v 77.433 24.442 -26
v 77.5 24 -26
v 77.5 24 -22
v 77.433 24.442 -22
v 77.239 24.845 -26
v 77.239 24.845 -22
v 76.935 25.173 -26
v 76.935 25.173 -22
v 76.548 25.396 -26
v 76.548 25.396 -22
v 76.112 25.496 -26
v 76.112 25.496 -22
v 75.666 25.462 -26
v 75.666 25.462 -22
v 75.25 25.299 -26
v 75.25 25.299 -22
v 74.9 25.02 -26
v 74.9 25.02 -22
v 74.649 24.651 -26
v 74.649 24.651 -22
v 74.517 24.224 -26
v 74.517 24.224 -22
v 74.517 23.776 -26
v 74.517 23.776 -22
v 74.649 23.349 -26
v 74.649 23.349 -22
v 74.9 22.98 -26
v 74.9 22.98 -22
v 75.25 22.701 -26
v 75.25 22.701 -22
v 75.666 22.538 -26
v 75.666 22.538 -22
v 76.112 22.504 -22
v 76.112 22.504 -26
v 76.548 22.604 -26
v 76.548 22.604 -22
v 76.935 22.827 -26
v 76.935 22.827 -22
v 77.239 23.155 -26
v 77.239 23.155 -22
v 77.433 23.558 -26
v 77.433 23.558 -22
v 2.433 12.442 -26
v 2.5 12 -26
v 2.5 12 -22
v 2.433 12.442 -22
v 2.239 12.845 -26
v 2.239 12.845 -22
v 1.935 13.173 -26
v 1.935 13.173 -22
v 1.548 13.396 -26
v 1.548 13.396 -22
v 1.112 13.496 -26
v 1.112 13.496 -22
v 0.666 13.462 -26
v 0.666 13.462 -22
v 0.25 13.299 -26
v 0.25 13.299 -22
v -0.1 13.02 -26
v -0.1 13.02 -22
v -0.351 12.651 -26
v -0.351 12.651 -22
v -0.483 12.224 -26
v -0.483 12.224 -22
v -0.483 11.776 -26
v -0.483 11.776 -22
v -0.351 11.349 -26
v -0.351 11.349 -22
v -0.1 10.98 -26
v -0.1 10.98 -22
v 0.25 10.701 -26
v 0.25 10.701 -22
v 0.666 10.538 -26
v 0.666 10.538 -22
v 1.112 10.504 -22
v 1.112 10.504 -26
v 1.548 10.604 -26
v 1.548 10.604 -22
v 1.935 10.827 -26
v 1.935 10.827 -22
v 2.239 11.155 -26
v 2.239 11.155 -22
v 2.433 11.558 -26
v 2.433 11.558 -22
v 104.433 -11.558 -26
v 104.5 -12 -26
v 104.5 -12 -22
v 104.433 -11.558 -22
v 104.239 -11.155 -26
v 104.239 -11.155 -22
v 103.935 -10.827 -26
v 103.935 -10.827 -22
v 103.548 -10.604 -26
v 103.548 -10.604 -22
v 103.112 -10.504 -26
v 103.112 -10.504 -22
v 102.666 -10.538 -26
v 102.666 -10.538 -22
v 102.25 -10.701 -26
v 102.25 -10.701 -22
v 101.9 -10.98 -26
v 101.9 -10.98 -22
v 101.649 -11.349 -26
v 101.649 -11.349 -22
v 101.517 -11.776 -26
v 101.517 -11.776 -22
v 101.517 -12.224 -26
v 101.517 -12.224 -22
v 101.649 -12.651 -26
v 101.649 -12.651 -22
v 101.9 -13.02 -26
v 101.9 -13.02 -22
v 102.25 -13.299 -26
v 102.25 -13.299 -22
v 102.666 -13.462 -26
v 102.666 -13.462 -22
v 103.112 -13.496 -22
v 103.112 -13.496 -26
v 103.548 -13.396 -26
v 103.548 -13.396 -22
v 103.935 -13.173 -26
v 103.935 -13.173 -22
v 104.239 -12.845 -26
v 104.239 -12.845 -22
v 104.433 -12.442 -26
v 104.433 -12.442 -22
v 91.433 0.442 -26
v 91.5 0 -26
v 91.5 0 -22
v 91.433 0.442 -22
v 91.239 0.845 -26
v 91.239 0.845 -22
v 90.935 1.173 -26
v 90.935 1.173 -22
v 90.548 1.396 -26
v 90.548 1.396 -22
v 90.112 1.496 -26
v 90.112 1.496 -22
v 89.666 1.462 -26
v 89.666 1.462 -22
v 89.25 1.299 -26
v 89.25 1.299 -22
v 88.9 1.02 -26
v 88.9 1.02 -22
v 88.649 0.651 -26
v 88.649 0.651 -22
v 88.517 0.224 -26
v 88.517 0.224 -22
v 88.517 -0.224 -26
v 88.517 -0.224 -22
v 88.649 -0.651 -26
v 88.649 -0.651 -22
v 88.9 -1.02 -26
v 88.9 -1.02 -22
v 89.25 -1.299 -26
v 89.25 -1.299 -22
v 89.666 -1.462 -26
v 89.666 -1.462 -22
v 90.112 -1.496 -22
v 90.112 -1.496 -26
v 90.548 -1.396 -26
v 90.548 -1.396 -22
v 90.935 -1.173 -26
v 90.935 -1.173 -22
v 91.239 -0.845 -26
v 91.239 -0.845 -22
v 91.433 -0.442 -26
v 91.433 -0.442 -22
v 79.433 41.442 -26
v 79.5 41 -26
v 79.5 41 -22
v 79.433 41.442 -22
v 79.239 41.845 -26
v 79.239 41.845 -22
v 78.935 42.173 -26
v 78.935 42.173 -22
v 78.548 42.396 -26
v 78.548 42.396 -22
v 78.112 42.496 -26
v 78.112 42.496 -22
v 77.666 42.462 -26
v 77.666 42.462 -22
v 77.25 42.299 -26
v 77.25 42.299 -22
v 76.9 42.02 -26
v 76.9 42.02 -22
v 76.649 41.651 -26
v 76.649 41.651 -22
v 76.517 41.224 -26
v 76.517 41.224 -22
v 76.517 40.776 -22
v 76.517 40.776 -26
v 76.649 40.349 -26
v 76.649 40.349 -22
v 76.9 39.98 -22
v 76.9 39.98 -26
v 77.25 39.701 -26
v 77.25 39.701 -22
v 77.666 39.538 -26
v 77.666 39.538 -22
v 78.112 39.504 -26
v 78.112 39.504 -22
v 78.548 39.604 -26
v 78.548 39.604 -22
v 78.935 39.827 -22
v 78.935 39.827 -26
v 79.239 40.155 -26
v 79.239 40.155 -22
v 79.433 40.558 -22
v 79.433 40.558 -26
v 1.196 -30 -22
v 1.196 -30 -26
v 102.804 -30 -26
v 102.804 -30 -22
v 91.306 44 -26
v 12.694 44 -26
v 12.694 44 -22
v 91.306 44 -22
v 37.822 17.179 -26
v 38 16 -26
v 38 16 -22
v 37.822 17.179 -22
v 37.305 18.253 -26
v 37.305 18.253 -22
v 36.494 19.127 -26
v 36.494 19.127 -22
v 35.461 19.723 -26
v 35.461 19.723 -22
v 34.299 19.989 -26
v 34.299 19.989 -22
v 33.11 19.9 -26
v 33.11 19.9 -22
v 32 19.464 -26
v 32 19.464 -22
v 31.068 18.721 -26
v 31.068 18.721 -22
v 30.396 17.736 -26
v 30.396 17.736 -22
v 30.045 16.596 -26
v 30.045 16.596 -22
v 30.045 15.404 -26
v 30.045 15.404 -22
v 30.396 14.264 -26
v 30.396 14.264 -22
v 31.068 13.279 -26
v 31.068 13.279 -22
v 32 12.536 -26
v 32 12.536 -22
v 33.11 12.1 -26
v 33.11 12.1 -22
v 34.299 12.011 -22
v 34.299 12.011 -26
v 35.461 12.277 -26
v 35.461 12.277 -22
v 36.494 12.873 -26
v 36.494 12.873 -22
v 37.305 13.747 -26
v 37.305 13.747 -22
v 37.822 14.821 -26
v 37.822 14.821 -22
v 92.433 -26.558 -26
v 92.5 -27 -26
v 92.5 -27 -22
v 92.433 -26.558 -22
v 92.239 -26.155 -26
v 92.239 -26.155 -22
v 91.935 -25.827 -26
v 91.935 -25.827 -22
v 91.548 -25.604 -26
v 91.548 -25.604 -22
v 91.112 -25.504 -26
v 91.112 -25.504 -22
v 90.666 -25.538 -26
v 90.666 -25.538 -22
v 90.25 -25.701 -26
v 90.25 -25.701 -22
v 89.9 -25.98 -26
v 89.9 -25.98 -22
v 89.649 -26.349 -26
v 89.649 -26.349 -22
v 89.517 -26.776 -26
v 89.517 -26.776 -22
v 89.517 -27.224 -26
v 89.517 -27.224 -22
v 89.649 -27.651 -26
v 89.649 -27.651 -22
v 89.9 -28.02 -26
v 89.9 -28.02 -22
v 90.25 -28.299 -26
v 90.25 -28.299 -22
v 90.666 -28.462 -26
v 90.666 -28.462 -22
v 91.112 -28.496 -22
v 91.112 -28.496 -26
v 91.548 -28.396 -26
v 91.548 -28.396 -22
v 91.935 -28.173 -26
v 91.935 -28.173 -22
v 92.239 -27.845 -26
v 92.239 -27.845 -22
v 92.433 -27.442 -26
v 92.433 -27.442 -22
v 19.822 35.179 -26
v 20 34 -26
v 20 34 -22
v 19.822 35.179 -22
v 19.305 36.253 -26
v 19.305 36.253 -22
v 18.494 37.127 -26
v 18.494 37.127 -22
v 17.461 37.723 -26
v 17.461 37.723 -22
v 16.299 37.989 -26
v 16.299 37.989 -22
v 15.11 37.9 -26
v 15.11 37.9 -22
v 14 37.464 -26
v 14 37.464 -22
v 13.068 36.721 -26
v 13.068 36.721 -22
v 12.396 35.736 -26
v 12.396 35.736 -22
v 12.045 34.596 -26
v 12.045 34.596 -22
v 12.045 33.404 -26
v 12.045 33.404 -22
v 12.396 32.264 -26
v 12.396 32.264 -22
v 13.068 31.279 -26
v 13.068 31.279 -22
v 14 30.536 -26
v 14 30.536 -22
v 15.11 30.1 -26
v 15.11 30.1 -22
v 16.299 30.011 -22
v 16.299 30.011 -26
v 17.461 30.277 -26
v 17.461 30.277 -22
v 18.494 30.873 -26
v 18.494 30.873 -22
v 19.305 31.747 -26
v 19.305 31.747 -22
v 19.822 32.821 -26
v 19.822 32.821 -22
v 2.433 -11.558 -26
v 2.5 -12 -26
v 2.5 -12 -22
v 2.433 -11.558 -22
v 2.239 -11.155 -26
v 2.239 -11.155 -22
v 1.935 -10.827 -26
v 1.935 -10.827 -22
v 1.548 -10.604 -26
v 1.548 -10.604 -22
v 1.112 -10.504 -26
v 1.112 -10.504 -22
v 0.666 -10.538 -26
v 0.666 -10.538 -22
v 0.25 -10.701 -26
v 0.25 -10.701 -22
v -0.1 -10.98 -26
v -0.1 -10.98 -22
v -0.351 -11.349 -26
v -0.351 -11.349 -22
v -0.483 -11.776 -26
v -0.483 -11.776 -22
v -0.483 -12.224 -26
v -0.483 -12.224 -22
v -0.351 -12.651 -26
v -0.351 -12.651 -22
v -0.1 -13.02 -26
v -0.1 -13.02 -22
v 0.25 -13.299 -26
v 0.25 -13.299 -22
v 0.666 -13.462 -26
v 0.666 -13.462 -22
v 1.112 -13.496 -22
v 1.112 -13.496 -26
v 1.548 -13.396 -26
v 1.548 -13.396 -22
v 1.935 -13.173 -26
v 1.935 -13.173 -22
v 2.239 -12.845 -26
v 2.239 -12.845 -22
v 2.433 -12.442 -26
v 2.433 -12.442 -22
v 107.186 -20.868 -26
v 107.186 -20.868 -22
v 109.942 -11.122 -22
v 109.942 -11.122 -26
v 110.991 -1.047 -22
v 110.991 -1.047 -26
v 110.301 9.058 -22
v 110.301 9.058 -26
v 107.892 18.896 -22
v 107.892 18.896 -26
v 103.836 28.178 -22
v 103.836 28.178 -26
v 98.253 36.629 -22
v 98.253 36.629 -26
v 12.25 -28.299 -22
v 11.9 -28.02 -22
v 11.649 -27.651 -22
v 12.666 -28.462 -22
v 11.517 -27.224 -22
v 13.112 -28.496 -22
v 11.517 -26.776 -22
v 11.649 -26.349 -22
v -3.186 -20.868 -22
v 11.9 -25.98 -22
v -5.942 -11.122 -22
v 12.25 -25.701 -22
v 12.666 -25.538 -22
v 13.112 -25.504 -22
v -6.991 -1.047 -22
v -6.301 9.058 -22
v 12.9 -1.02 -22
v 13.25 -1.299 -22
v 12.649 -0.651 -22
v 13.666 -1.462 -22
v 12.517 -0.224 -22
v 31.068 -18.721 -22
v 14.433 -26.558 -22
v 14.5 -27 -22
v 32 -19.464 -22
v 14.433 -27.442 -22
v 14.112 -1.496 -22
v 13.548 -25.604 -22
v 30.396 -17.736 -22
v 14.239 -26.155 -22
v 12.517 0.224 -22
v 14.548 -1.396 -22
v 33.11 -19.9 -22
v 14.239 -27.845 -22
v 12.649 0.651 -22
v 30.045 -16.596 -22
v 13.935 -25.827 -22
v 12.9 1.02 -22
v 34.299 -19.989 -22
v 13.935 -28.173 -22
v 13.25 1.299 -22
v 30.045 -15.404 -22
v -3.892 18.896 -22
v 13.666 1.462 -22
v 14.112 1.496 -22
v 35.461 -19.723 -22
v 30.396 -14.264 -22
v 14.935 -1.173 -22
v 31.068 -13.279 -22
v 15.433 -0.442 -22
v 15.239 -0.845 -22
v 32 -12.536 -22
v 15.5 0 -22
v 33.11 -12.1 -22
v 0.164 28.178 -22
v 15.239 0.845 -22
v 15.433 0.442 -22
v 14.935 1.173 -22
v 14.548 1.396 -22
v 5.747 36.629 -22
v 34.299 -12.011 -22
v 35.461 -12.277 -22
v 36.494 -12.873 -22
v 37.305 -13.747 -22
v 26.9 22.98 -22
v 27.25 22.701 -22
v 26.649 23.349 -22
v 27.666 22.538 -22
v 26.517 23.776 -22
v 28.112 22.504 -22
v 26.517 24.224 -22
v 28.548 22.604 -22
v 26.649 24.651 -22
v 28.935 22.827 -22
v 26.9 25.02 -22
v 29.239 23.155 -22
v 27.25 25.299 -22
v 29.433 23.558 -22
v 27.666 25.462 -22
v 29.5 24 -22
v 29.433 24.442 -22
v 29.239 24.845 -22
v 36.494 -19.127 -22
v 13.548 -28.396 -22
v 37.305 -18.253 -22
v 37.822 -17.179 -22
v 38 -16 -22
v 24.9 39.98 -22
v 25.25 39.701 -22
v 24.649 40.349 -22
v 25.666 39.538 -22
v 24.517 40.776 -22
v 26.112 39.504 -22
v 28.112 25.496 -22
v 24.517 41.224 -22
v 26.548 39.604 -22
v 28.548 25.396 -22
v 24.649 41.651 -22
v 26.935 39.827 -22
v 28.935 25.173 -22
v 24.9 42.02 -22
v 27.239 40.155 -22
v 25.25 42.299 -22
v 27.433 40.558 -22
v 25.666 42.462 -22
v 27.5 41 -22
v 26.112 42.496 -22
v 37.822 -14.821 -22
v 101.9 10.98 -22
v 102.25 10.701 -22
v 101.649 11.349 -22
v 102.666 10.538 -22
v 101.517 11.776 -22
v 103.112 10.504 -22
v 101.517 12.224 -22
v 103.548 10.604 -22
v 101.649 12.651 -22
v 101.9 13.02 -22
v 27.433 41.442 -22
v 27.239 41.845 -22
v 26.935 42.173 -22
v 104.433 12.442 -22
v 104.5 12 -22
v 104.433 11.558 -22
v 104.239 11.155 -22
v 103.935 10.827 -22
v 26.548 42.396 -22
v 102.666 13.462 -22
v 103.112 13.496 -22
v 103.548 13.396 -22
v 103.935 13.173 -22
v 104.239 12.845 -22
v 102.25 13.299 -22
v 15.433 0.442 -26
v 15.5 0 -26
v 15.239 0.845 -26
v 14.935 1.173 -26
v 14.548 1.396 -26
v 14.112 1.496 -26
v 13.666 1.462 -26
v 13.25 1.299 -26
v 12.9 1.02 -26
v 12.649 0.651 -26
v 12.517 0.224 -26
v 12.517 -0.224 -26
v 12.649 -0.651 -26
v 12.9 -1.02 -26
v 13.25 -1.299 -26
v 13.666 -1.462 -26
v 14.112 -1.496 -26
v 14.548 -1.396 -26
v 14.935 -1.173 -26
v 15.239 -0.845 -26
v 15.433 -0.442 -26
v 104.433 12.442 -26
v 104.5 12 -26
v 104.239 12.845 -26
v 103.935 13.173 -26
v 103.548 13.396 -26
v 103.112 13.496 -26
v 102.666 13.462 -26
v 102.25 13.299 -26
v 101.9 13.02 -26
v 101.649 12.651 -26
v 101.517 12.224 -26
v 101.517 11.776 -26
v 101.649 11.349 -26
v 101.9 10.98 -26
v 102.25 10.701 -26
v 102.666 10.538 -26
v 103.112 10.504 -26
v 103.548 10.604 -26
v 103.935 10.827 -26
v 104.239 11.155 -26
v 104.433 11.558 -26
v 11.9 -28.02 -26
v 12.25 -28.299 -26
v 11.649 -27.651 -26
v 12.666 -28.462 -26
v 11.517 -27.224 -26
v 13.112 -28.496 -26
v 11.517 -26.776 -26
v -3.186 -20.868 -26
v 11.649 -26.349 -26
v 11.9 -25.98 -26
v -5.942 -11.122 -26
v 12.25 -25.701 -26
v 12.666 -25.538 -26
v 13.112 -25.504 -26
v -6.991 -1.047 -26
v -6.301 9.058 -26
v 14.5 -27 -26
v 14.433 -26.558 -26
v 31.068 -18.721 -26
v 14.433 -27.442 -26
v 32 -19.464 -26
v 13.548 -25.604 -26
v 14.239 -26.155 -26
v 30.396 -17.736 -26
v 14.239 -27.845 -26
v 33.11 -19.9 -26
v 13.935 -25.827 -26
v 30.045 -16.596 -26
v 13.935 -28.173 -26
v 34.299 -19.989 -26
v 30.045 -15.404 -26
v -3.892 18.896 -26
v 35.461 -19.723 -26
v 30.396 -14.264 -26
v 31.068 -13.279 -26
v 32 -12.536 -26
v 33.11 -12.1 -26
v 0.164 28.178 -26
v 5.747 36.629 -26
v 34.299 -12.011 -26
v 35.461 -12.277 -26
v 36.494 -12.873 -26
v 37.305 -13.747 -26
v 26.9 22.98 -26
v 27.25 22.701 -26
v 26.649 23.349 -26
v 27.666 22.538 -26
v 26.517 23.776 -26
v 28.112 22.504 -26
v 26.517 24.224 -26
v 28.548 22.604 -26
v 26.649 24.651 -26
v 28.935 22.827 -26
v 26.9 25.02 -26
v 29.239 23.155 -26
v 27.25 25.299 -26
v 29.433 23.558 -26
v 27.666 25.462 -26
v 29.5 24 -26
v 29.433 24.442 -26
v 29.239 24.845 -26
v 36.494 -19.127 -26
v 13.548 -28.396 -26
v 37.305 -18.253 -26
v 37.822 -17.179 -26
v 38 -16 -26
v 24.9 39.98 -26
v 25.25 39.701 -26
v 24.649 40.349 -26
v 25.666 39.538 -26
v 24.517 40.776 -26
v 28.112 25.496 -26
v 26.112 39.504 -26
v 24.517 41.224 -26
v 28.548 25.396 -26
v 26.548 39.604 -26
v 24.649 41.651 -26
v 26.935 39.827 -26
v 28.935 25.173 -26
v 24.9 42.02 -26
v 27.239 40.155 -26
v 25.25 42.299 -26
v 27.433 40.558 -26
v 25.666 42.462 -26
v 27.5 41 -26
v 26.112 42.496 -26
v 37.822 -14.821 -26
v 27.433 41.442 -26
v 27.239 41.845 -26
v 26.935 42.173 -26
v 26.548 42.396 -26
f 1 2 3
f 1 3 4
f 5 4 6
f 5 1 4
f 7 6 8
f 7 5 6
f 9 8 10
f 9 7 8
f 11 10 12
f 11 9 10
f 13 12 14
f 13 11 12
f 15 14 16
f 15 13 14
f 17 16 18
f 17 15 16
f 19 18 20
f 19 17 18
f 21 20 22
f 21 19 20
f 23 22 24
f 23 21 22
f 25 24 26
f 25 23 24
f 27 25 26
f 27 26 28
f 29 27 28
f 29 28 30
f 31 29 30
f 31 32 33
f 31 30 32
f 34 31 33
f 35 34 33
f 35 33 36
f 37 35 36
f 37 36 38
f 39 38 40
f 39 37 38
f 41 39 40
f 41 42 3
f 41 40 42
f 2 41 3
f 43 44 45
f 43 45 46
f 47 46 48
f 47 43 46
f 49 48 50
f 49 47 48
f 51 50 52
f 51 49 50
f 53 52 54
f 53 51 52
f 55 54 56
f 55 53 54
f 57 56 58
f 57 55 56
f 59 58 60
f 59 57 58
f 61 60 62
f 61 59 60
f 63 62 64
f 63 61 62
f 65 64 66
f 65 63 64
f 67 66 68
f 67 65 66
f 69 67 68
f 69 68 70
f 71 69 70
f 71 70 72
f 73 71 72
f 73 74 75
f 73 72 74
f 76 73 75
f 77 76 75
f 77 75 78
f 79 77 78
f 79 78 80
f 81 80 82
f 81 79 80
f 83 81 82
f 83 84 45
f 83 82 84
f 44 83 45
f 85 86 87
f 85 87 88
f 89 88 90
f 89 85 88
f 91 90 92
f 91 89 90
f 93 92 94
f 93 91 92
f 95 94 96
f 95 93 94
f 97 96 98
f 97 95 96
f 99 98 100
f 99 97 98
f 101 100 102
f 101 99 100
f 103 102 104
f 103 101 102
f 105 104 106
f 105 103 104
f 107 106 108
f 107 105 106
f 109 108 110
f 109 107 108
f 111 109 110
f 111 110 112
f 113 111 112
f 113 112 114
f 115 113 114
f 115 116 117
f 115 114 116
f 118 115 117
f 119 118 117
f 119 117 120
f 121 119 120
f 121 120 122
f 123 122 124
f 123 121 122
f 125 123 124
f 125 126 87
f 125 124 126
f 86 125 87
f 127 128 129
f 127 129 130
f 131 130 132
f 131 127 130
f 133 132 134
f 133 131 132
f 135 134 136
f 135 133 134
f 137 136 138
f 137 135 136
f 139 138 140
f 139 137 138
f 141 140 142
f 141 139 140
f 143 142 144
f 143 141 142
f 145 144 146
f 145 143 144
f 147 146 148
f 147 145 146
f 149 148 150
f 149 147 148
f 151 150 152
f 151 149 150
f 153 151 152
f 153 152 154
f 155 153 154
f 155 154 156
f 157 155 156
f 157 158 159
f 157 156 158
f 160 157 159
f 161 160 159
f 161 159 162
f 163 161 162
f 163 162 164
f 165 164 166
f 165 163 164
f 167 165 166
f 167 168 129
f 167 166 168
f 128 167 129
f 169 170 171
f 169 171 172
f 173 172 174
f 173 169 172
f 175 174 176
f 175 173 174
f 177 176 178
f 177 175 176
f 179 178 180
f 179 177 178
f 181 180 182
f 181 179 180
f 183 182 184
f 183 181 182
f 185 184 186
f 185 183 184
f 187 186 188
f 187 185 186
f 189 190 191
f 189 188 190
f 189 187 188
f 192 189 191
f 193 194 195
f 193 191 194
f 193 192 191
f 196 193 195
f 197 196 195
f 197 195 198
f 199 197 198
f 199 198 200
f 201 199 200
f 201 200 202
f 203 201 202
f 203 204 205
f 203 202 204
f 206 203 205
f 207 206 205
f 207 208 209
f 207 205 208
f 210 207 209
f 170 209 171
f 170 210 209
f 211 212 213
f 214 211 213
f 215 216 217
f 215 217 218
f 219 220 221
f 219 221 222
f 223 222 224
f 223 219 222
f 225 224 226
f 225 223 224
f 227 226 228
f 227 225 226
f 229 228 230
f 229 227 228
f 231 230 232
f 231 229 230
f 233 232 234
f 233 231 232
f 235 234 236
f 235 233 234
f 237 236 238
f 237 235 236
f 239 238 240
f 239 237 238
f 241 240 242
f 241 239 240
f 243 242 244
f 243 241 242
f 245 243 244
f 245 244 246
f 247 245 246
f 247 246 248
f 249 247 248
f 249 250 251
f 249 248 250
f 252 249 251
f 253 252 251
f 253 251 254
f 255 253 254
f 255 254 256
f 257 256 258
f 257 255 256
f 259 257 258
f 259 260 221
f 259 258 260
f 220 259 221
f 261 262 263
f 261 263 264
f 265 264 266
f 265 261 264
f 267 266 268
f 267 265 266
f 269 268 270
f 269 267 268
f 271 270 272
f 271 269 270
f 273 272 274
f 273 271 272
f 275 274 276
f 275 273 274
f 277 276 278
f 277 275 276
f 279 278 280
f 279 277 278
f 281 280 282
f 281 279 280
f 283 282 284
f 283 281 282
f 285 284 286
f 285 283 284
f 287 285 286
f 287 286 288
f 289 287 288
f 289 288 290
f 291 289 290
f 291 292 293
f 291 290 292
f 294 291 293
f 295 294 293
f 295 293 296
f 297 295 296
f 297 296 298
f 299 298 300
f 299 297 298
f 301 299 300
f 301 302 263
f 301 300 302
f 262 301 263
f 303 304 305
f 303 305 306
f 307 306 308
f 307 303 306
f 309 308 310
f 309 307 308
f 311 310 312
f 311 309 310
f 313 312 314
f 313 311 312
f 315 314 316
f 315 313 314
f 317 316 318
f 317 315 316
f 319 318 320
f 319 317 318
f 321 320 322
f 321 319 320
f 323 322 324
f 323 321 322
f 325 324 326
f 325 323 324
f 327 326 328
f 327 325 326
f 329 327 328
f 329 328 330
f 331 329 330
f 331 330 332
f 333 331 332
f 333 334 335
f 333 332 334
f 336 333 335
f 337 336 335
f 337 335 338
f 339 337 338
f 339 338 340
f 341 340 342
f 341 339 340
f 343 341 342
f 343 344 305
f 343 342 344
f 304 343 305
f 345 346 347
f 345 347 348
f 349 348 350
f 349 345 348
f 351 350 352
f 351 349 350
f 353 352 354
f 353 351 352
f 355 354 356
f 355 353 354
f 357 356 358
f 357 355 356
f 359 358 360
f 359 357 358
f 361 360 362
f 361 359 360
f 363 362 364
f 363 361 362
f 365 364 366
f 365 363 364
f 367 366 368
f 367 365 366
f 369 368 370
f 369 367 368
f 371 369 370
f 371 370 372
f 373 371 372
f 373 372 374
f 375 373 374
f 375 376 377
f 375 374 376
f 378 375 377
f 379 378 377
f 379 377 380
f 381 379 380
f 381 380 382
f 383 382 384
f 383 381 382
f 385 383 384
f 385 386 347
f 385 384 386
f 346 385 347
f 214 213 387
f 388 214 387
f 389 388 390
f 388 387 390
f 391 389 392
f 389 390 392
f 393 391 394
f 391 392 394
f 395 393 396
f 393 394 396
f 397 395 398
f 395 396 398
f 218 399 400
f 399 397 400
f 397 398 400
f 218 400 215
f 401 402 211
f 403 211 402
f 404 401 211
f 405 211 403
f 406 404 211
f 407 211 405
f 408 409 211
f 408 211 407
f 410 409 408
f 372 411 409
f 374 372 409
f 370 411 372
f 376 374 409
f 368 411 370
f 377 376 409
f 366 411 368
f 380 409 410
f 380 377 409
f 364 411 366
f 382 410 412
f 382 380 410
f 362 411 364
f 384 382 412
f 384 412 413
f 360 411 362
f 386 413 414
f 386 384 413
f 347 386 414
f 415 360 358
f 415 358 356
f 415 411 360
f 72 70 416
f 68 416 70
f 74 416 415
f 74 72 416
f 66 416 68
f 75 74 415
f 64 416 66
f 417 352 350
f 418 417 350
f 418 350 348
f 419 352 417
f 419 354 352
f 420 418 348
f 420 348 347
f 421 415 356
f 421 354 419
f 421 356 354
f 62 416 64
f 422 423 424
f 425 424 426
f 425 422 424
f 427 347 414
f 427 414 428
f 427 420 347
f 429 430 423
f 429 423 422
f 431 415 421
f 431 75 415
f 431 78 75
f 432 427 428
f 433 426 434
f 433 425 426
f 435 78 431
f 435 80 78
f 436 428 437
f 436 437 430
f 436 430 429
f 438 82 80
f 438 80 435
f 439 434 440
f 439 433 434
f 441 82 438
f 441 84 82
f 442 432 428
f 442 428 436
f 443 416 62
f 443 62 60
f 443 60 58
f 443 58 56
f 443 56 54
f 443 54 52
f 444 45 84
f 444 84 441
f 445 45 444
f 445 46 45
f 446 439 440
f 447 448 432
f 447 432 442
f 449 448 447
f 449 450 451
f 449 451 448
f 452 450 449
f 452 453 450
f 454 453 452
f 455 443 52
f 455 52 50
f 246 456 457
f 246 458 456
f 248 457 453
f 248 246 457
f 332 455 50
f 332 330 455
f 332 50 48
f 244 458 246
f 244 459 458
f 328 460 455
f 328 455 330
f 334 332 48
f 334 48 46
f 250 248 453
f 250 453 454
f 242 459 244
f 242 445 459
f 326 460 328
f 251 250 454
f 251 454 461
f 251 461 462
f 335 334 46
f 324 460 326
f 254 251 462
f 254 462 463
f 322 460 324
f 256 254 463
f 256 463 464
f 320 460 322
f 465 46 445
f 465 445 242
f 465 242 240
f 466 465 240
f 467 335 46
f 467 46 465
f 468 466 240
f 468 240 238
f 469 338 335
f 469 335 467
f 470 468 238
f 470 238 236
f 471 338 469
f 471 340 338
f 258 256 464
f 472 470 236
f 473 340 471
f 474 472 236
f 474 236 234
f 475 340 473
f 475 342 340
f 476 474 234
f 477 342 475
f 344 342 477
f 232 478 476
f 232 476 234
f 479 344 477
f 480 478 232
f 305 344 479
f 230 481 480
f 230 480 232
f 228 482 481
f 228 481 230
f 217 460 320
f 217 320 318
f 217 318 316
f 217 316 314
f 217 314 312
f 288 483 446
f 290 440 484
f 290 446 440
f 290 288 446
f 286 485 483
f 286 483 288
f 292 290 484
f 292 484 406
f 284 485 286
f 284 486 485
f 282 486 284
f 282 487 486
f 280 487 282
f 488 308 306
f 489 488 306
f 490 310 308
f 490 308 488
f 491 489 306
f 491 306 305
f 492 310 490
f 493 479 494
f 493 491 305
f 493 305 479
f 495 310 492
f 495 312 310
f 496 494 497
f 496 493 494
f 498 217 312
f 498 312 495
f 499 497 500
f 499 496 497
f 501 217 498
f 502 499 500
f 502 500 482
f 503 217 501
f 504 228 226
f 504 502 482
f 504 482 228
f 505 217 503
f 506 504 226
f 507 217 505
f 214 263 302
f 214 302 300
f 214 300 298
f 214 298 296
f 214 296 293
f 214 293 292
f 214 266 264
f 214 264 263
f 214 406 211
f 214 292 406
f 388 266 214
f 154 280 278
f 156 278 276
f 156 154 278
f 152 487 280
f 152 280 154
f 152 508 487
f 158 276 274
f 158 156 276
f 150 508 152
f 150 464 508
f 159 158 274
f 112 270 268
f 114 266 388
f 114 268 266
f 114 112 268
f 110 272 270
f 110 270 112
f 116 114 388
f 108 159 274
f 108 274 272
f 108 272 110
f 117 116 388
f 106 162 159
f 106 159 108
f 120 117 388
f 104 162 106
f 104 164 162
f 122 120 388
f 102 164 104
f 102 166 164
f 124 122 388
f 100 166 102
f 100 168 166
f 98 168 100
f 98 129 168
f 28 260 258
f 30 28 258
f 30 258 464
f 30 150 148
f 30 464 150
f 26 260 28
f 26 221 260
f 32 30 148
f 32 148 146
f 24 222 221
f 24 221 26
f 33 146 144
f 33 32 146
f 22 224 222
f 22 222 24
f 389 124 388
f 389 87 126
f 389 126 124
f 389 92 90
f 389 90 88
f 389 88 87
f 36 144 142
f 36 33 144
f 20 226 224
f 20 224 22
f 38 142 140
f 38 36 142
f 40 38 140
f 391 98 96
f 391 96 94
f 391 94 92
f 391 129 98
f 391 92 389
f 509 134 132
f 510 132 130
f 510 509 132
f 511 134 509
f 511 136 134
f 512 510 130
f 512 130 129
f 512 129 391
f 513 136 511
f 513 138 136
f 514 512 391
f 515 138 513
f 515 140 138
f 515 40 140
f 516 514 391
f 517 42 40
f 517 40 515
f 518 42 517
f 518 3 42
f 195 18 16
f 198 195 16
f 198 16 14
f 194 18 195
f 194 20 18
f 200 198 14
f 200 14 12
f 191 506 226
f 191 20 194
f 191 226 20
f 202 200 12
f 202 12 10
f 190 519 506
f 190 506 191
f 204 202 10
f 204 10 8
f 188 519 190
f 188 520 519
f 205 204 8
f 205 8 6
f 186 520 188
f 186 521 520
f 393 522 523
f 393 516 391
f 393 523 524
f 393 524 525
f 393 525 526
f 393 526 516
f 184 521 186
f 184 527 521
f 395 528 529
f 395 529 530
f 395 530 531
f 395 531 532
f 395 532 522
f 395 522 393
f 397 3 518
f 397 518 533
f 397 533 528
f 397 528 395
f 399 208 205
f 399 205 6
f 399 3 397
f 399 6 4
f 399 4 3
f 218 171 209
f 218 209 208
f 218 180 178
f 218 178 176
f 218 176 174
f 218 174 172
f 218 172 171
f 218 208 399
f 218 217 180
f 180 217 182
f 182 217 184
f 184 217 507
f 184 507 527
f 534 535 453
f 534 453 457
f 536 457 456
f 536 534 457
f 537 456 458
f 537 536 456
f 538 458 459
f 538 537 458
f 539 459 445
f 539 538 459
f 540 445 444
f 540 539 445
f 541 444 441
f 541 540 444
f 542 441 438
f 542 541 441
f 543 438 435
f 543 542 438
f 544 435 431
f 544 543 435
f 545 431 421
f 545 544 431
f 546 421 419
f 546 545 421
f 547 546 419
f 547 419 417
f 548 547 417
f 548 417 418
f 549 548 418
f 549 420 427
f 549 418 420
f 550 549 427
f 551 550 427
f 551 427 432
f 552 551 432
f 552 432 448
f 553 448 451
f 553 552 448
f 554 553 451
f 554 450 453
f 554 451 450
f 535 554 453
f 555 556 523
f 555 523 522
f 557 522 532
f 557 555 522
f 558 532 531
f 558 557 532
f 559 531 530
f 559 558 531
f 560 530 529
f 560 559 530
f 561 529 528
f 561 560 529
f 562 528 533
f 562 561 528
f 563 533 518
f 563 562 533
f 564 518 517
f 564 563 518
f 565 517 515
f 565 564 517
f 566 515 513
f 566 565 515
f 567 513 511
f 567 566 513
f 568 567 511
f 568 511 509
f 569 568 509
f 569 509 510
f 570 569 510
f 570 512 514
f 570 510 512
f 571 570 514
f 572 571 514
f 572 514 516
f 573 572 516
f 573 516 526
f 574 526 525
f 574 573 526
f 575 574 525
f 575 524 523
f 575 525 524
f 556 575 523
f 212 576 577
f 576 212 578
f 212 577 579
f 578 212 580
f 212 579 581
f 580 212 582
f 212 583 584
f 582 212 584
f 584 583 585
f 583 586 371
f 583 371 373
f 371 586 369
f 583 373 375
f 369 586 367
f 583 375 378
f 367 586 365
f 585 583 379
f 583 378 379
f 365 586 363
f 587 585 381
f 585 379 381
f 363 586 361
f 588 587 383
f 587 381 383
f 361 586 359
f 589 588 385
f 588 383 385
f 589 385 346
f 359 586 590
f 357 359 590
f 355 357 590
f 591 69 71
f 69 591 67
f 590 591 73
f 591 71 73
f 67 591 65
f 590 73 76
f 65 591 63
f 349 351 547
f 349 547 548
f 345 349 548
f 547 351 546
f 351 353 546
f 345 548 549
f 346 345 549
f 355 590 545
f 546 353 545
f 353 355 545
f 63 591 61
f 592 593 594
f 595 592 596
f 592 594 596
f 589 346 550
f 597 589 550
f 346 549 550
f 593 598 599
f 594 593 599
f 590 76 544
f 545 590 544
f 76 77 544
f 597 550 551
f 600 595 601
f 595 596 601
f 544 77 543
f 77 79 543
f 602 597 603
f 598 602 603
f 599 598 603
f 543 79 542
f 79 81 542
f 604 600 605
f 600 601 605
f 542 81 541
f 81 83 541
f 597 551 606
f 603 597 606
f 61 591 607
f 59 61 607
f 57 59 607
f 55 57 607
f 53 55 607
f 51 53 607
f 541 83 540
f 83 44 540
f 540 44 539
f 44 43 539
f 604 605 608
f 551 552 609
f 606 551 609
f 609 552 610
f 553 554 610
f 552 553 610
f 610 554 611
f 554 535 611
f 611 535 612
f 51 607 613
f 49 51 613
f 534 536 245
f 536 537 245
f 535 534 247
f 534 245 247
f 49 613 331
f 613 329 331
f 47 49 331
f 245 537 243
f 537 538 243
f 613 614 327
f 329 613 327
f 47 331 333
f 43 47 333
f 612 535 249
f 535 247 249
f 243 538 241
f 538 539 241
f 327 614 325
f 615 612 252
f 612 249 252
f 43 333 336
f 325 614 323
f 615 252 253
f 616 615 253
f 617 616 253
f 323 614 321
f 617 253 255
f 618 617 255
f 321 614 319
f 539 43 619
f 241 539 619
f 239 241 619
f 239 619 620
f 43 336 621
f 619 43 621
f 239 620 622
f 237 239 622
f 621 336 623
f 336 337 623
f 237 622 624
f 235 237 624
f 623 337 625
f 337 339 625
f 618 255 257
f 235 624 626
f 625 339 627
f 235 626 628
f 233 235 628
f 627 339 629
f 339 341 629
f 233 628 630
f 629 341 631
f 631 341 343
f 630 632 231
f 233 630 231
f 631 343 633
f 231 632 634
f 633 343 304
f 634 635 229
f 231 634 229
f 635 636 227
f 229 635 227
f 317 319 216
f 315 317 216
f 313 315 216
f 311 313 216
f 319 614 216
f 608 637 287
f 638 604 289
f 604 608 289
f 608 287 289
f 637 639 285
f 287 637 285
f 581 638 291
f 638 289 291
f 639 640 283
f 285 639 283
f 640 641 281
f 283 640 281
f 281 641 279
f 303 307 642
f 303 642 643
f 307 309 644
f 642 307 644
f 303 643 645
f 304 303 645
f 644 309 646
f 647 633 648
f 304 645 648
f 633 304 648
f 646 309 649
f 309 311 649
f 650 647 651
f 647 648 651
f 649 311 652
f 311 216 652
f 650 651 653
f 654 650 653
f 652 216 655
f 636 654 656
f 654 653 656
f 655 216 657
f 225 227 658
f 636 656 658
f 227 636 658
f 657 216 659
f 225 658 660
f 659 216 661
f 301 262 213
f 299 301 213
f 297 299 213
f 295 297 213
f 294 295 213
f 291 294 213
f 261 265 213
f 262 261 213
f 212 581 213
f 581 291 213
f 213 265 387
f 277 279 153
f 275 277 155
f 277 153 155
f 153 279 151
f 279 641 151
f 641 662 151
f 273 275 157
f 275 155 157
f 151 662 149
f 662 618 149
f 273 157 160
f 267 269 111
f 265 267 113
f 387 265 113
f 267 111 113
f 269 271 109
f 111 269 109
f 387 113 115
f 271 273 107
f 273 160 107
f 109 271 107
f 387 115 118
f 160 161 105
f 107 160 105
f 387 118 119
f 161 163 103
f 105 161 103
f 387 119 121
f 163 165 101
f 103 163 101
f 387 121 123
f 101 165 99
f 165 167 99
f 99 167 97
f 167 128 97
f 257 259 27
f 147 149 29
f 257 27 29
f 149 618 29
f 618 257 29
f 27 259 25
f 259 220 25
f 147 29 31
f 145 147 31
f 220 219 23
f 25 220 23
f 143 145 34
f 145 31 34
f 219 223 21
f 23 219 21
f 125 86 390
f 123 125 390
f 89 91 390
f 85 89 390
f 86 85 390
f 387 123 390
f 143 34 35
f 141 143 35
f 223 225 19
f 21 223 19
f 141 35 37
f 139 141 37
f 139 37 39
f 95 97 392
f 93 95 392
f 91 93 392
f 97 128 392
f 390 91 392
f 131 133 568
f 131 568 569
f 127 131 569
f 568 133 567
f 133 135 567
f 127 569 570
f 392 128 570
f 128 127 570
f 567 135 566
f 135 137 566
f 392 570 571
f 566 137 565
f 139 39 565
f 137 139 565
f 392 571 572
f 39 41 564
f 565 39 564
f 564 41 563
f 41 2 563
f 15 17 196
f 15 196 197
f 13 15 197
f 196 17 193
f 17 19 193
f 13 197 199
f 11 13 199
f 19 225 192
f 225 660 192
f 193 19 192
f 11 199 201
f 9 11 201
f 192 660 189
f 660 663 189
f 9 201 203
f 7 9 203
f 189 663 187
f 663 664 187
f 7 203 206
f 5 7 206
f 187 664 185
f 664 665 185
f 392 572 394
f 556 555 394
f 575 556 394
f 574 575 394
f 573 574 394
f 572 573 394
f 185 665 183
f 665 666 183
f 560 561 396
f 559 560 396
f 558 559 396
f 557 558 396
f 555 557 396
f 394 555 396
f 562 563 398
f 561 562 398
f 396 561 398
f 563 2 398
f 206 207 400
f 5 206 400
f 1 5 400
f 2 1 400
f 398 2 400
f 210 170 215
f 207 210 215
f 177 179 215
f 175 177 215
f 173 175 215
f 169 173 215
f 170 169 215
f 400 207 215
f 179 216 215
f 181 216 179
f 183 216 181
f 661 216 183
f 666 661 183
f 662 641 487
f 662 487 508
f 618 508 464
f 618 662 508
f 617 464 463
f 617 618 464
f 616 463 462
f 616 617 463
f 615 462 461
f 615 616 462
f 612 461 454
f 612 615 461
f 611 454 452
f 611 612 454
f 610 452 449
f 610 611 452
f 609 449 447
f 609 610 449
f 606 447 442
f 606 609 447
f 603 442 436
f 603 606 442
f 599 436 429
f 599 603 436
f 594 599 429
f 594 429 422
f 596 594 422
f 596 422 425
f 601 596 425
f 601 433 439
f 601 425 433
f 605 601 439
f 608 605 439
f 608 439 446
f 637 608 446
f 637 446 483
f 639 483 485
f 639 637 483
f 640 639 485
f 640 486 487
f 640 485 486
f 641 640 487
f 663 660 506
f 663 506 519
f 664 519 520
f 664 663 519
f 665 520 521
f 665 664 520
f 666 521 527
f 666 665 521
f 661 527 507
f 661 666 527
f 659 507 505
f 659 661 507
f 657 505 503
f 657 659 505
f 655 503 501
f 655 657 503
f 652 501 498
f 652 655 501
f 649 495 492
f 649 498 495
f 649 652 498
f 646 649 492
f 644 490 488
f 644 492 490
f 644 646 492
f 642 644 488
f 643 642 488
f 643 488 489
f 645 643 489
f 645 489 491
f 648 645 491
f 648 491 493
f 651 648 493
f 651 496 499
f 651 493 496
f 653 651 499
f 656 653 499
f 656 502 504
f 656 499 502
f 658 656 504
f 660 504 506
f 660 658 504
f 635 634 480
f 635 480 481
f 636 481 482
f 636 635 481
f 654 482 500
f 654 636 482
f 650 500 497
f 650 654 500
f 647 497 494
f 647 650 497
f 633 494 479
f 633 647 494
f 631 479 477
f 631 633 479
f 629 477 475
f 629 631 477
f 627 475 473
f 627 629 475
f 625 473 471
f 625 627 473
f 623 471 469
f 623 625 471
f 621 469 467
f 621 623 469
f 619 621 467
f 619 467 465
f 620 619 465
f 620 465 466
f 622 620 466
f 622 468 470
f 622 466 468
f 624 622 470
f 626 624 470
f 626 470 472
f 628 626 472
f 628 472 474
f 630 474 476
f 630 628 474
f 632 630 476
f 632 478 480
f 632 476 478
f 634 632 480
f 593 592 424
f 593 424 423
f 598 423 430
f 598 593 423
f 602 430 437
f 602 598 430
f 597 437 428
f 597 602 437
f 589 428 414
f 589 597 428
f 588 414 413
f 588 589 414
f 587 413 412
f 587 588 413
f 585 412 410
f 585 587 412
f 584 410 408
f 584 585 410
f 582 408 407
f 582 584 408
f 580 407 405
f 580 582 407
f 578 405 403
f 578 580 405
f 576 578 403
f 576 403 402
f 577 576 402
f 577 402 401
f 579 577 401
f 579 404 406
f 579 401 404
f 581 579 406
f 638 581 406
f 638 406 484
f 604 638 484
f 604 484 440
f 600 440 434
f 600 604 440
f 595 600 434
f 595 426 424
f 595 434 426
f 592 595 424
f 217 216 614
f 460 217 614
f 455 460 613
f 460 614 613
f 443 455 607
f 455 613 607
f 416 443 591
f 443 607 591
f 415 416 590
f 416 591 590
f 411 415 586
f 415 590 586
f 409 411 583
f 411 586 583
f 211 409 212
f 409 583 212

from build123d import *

# Parameters (mm, degrees)
CYLINDER1528_R     = 1.5
CYLINDER1528_DEPTH = 100
CYLINDER1527_R     = 1.5
CYLINDER1527_DEPTH = 100
CYLINDER1526_R     = 1.5
CYLINDER1526_DEPTH = 32
CYLINDER1525_R     = 1.5
CYLINDER1525_DEPTH = 32
BOX520_W           = 200
BOX520_H           = 100
BOX520_DEPTH       = 100
BOX519_W           = 200
BOX519_H           = 100
BOX519_DEPTH       = 100
CYLINDER1518_R     = 4
CYLINDER1518_DEPTH = 100
CYLINDER1519_R     = 4
CYLINDER1519_DEPTH = 100
CYLINDER1520_R     = 4
CYLINDER1520_DEPTH = 100
CYLINDER1521_R     = 4
CYLINDER1521_DEPTH = 100
CYLINDER1522_R     = 4
CYLINDER1522_DEPTH = 100
CYLINDER1523_R     = 4
CYLINDER1523_DEPTH = 100
CYLINDER1524_R     = 4
CYLINDER1524_DEPTH = 100
CYLINDER1517_R     = 4
CYLINDER1517_DEPTH = 100
CYLINDER1510_R     = 1.5
CYLINDER1510_DEPTH = 100
CYLINDER1511_R     = 1.5
CYLINDER1511_DEPTH = 100
CYLINDER1512_R     = 1.5
CYLINDER1512_DEPTH = 100
CYLINDER1513_R     = 1.5
CYLINDER1513_DEPTH = 100
CYLINDER1514_R     = 1.5
CYLINDER1514_DEPTH = 100
CYLINDER1515_R     = 1.5
CYLINDER1515_DEPTH = 100
CYLINDER1516_R     = 1.5
CYLINDER1516_DEPTH = 100
CYLINDER1509_R     = 1.5
CYLINDER1509_DEPTH = 100
CYLINDER1508_R     = 59
CYLINDER1508_DEPTH = 4


with BuildPart() as v_lec1528:
    # Cylinder1528 → Cylinder1528 (new body)
    with BuildSketch(Plane(origin=(14, 0, -60), x_dir=(1, 0, 0), z_dir=(0, 0, 1))):
        Circle(CYLINDER1528_R)
    extrude(amount=CYLINDER1528_DEPTH)


with BuildPart() as srouby_troj010:
    # Cylinder1527 → Cylinder1527 (new body)
    with BuildSketch(Plane(origin=(90, 0, -60), x_dir=(1, 0, 0), z_dir=(0, 0, 1))):
        Circle(CYLINDER1527_R)
    extrude(amount=CYLINDER1527_DEPTH)

    # Compound900: union Válec1528
    add(v_lec1528.part)


with BuildPart() as v_lec1526:
    # Cylinder1526 → Cylinder1526 (new body)
    with BuildSketch(Plane(origin=(78, 41, -42), x_dir=(1, 0, 0), z_dir=(0, 0, 1))):
        Circle(CYLINDER1526_R)
    extrude(amount=CYLINDER1526_DEPTH)


with BuildPart() as compound899:
    # Cylinder1525 → Cylinder1525 (new body)
    with BuildSketch(Plane(origin=(26, 41, -42), x_dir=(1, 0, 0), z_dir=(0, 0, 1))):
        Circle(CYLINDER1525_R)
    extrude(amount=CYLINDER1525_DEPTH)

    # Compound899: union Válec1526
    add(v_lec1526.part)


with BuildPart() as krychle520:
    # Box520 → Box520 (new body)
    with BuildSketch(Plane(origin=(-60, 44, -90), x_dir=(1, 0, 0), z_dir=(0, 0, 1))):
        with Locations((100, 50)):
            Rectangle(BOX520_W, BOX520_H)
    extrude(amount=BOX520_DEPTH)


with BuildPart() as krychle519:
    # Box519 → Box519 (new body)
    with BuildSketch(Plane(origin=(-60, -130, -90), x_dir=(1, 0, 0), z_dir=(0, 0, 1))):
        with Locations((100, 50)):
            Rectangle(BOX519_W, BOX519_H)
    extrude(amount=BOX519_DEPTH)


with BuildPart() as v_lec1518:
    # Cylinder1518 → Cylinder1518 (new body)
    with BuildSketch(Plane(origin=(-16, 34, -90), x_dir=(1, 0, 0), z_dir=(0, 0, 1))):
        Circle(CYLINDER1518_R)
    extrude(amount=CYLINDER1518_DEPTH)


with BuildPart() as v_lec1519:
    # Cylinder1519 → Cylinder1519 (new body)
    with BuildSketch(Plane(origin=(-16, -34, -90), x_dir=(1, 0, 0), z_dir=(0, 0, 1))):
        Circle(CYLINDER1519_R)
    extrude(amount=CYLINDER1519_DEPTH)


with BuildPart() as v_lec1520:
    # Cylinder1520 → Cylinder1520 (new body)
    with BuildSketch(Plane(origin=(34, -16, -90), x_dir=(1, 0, 0), z_dir=(0, 0, 1))):
        Circle(CYLINDER1520_R)
    extrude(amount=CYLINDER1520_DEPTH)


with BuildPart() as v_lec1521:
    # Cylinder1521 → Cylinder1521 (new body)
    with BuildSketch(Plane(origin=(16, 34, -90), x_dir=(1, 0, 0), z_dir=(0, 0, 1))):
        Circle(CYLINDER1521_R)
    extrude(amount=CYLINDER1521_DEPTH)


with BuildPart() as v_lec1522:
    # Cylinder1522 → Cylinder1522 (new body)
    with BuildSketch(Plane(origin=(16, -34, -90), x_dir=(1, 0, 0), z_dir=(0, 0, 1))):
        Circle(CYLINDER1522_R)
    extrude(amount=CYLINDER1522_DEPTH)


with BuildPart() as v_lec1523:
    # Cylinder1523 → Cylinder1523 (new body)
    with BuildSketch(Plane(origin=(-34, 16, -90), x_dir=(1, 0, 0), z_dir=(0, 0, 1))):
        Circle(CYLINDER1523_R)
    extrude(amount=CYLINDER1523_DEPTH)


with BuildPart() as v_lec1524:
    # Cylinder1524 → Cylinder1524 (new body)
    with BuildSketch(Plane(origin=(34, 16, -90), x_dir=(1, 0, 0), z_dir=(0, 0, 1))):
        Circle(CYLINDER1524_R)
    extrude(amount=CYLINDER1524_DEPTH)


with BuildPart() as sbouby_baze_silne005:
    # Cylinder1517 → Cylinder1517 (new body)
    with BuildSketch(Plane(origin=(-34, -16, -90), x_dir=(1, 0, 0), z_dir=(0, 0, 1))):
        Circle(CYLINDER1517_R)
    extrude(amount=CYLINDER1517_DEPTH)

    # Compound898: union Válec1518, Válec1519, Válec1520, Válec1521, Válec1522, Válec1523, Válec1524
    add(v_lec1518.part)
    add(v_lec1519.part)
    add(v_lec1520.part)
    add(v_lec1521.part)
    add(v_lec1522.part)
    add(v_lec1523.part)
    add(v_lec1524.part)


with BuildPart() as v_lec1510:
    # Cylinder1510 → Cylinder1510 (new body)
    with BuildSketch(Plane(origin=(103, 12, -60), x_dir=(1, 0, 0), z_dir=(0, 0, 1))):
        Circle(CYLINDER1510_R)
    extrude(amount=CYLINDER1510_DEPTH)


with BuildPart() as v_lec1511:
    # Cylinder1511 → Cylinder1511 (new body)
    with BuildSketch(Plane(origin=(76, 24, -60), x_dir=(1, 0, 0), z_dir=(0, 0, 1))):
        Circle(CYLINDER1511_R)
    extrude(amount=CYLINDER1511_DEPTH)


with BuildPart() as v_lec1512:
    # Cylinder1512 → Cylinder1512 (new body)
    with BuildSketch(Plane(origin=(91, -27, -60), x_dir=(1, 0, 0), z_dir=(0, 0, 1))):
        Circle(CYLINDER1512_R)
    extrude(amount=CYLINDER1512_DEPTH)


with BuildPart() as v_lec1513:
    # Cylinder1513 → Cylinder1513 (new body)
    with BuildSketch(Plane(origin=(13, -27, -60), x_dir=(1, 0, 0), z_dir=(0, 0, 1))):
        Circle(CYLINDER1513_R)
    extrude(amount=CYLINDER1513_DEPTH)


with BuildPart() as v_lec1514:
    # Cylinder1514 → Cylinder1514 (new body)
    with BuildSketch(Plane(origin=(28, 24, -60), x_dir=(1, 0, 0), z_dir=(0, 0, 1))):
        Circle(CYLINDER1514_R)
    extrude(amount=CYLINDER1514_DEPTH)


with BuildPart() as v_lec1515:
    # Cylinder1515 → Cylinder1515 (new body)
    with BuildSketch(Plane(origin=(1, -12, -60), x_dir=(1, 0, 0), z_dir=(0, 0, 1))):
        Circle(CYLINDER1515_R)
    extrude(amount=CYLINDER1515_DEPTH)


with BuildPart() as v_lec1516:
    # Cylinder1516 → Cylinder1516 (new body)
    with BuildSketch(Plane(origin=(1, 12, -60), x_dir=(1, 0, 0), z_dir=(0, 0, 1))):
        Circle(CYLINDER1516_R)
    extrude(amount=CYLINDER1516_DEPTH)


with BuildPart() as srouby_monoblok003:
    # Cylinder1509 → Cylinder1509 (new body)
    with BuildSketch(Plane(origin=(103, -12, -60), x_dir=(1, 0, 0), z_dir=(0, 0, 1))):
        Circle(CYLINDER1509_R)
    extrude(amount=CYLINDER1509_DEPTH)

    # Compound897: union Válec1510, Válec1511, Válec1512, Válec1513, Válec1514, Válec1515, Válec1516
    add(v_lec1510.part)
    add(v_lec1511.part)
    add(v_lec1512.part)
    add(v_lec1513.part)
    add(v_lec1514.part)
    add(v_lec1515.part)
    add(v_lec1516.part)


with BuildPart() as cut510:
    # Cylinder1508 → Cylinder1508 (new body)
    with BuildSketch(Plane(origin=(52, 0, -26), x_dir=(1, 0, 0), z_dir=(0, 0, 1))):
        Circle(CYLINDER1508_R)
    extrude(amount=CYLINDER1508_DEPTH)

    # Cut505: cut srouby_monoblok003
    add(srouby_monoblok003.part, mode=Mode.SUBTRACT)

    # Cut506: cut sbouby_baze_silne005
    add(sbouby_baze_silne005.part, mode=Mode.SUBTRACT)

    # Cut507: cut Krychle519
    add(krychle519.part, mode=Mode.SUBTRACT)

    # Cut508: cut Krychle520
    add(krychle520.part, mode=Mode.SUBTRACT)

    # Cut509: cut Compound899
    add(compound899.part, mode=Mode.SUBTRACT)

    # Cut510: cut srouby_troj010
    add(srouby_troj010.part, mode=Mode.SUBTRACT)


solid = cut510.part
